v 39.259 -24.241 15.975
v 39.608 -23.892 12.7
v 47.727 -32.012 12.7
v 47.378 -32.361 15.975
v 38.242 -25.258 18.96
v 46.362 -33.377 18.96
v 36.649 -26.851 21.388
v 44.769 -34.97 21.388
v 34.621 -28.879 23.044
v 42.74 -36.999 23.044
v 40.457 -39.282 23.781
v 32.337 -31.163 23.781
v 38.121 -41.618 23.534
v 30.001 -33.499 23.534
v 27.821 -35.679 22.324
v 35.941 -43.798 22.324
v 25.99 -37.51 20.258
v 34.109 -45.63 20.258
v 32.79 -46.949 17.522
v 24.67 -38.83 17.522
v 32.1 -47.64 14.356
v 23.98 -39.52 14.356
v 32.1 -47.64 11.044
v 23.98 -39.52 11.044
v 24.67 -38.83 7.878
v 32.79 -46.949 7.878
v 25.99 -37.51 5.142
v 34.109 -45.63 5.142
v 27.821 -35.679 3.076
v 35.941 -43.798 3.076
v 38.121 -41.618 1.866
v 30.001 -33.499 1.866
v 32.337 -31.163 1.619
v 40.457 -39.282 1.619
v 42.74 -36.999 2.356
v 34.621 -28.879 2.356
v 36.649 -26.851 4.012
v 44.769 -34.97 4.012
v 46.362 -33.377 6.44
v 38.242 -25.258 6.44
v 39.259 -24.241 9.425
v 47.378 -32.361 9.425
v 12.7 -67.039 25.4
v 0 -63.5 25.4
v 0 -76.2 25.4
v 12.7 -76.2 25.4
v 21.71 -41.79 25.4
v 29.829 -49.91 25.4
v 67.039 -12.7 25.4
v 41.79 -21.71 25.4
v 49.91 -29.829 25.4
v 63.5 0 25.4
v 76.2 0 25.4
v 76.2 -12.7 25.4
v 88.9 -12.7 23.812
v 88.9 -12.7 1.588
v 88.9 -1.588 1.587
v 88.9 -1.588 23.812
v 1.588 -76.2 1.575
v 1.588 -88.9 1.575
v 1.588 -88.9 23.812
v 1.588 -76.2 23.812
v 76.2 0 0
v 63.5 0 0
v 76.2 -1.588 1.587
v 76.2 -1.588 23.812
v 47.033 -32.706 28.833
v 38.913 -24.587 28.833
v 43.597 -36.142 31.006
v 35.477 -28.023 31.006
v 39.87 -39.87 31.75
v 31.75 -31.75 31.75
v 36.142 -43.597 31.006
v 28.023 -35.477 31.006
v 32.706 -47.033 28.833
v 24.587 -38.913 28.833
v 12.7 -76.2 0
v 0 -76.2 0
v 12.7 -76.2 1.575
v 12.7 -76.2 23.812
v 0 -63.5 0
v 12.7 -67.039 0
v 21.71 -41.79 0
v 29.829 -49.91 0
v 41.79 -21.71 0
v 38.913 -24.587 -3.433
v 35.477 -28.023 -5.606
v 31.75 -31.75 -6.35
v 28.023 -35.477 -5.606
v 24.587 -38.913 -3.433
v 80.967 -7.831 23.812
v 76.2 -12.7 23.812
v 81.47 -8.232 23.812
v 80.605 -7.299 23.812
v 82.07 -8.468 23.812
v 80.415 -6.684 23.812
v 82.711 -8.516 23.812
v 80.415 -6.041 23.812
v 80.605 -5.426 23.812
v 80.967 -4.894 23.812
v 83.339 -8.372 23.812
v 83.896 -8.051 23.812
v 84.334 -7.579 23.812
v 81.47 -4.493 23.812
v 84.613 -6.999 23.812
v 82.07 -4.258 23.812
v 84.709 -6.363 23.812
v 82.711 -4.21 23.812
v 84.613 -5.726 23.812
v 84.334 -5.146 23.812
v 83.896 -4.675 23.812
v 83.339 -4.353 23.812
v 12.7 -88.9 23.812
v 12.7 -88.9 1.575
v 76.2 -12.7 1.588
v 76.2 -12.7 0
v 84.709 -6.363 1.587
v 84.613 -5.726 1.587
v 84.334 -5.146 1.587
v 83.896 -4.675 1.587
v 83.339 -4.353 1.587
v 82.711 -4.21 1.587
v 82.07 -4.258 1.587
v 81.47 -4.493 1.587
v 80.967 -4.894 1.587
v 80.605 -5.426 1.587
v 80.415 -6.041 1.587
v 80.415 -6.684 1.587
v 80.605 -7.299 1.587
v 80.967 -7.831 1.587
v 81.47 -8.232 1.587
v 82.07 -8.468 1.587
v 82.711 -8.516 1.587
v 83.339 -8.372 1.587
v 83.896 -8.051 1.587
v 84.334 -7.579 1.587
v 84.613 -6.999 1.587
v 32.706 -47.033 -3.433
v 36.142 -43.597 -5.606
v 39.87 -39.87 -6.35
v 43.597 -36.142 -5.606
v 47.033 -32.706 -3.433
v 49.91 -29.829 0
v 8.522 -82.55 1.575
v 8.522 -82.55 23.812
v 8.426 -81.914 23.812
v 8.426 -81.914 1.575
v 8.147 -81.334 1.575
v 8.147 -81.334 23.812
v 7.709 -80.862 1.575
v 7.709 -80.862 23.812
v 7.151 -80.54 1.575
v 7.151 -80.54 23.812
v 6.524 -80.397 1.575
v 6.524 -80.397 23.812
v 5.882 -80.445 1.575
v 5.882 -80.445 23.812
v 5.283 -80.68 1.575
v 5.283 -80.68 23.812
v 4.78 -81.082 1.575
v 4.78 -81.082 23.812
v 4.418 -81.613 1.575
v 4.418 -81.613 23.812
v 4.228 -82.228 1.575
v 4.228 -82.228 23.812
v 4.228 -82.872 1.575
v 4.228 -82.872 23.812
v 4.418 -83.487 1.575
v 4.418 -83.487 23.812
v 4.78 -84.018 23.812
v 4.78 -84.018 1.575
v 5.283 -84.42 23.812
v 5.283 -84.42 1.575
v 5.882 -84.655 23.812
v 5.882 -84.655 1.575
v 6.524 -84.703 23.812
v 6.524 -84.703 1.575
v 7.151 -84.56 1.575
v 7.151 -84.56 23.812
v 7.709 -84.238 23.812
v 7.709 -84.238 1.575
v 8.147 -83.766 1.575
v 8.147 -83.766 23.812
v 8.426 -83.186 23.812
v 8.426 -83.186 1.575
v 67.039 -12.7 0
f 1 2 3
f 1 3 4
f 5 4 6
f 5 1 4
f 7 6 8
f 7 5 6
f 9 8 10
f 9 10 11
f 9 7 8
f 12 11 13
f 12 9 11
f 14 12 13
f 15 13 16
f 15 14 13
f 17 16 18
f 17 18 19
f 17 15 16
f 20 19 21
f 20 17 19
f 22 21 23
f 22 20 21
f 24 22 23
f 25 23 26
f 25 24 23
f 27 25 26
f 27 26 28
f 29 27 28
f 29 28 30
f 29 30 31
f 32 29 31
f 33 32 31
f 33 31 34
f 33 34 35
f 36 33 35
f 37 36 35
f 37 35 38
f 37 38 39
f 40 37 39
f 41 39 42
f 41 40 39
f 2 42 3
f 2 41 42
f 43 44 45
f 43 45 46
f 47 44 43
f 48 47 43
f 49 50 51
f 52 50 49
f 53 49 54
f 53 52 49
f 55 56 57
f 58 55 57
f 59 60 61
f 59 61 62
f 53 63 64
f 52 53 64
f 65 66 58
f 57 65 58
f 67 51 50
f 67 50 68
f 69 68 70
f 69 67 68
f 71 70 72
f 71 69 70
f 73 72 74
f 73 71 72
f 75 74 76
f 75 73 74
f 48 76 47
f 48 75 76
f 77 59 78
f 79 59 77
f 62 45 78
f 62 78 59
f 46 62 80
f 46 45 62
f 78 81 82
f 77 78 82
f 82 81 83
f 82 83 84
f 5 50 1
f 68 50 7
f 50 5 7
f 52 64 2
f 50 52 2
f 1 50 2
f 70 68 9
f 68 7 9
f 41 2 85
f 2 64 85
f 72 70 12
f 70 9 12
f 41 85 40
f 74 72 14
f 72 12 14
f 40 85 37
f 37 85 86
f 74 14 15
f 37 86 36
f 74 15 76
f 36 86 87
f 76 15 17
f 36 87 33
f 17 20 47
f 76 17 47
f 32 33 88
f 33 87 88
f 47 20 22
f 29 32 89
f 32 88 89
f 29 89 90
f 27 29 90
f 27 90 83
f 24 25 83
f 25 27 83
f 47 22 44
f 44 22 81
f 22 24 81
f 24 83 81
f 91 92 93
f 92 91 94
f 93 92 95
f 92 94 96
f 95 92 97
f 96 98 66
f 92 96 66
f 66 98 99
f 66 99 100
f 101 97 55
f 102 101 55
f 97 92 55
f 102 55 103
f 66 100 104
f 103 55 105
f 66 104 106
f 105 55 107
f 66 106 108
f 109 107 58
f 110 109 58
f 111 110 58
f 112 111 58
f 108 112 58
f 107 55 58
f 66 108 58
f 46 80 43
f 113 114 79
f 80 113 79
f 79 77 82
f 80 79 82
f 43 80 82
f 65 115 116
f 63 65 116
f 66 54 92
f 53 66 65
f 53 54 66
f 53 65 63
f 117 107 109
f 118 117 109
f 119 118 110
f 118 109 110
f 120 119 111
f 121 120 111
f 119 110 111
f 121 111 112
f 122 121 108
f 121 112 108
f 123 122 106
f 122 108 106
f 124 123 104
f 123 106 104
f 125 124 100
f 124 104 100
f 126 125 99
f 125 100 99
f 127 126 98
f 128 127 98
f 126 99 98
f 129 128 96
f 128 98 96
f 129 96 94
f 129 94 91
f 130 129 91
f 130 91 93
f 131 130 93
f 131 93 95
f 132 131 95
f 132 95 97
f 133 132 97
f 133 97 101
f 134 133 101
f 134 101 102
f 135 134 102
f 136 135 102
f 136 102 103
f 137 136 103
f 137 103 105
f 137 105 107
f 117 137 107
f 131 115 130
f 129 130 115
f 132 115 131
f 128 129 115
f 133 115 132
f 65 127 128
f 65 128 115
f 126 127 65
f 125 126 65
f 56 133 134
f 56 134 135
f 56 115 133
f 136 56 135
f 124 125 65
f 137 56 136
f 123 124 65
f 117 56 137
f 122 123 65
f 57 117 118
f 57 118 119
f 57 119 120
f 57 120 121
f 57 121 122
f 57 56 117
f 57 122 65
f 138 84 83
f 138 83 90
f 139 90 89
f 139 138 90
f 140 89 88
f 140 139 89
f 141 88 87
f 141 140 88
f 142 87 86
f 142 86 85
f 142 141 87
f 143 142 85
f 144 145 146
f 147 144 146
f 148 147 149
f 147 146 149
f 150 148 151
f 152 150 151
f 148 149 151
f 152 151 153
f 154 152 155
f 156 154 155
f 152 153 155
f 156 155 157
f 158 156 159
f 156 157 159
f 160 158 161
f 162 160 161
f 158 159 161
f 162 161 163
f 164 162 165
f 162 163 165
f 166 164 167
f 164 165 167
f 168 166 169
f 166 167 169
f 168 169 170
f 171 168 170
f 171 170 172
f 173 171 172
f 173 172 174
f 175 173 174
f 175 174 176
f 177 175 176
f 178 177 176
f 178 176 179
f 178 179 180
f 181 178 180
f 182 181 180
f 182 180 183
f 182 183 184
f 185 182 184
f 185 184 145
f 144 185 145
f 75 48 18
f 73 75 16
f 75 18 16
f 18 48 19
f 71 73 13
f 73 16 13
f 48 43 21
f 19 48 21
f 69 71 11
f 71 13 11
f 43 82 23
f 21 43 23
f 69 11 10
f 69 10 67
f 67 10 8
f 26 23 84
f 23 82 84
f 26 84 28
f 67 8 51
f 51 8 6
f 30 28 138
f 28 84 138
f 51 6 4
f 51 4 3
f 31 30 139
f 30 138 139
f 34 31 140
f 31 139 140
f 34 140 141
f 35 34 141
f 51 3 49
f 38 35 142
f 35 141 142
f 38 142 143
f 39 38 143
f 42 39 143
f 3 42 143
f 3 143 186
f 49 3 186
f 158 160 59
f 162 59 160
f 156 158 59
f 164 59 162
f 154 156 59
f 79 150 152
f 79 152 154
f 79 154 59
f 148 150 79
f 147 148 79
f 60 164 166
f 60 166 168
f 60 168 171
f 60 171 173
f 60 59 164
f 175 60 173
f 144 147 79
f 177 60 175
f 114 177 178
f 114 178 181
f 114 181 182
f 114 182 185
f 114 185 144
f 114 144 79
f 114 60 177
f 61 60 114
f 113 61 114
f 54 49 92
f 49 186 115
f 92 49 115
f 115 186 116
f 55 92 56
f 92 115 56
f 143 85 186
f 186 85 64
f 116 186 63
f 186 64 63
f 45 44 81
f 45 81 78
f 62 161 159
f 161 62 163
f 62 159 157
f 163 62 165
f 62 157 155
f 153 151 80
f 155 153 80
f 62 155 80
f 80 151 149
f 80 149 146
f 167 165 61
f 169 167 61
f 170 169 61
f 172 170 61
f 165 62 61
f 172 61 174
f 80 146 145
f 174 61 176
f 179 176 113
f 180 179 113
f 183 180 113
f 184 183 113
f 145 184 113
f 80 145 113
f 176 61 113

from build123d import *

# Parameters (mm, degrees)
BOSS_EXTRUDE1_DEPTH    = 25.4
SKETCH2_R              = 2.159
SKETCH2_W              = 12.7
SKETCH2_H              = 1.5875
SKETCH2_W_2            = 1.5875
SKETCH2_H_2            = 12.7
CUT_EXTRUDE1_DEPTH     = 25.4
SKETCH3_W              = 12.7
SKETCH3_H              = 1.5875
SKETCH3_H_2            = 1.5748
CUT_EXTRUDE2_DEPTH     = 12.7
SKETCH4_W              = 1.5875
SKETCH4_H              = 12.7
CUT_EXTRUDE3_DEPTH     = 12.7
F_3DSKETCH1_R          = 19.05
F_3DSKETCH1_R_2        = 11.1125
BOSS_EXTRUDE2_DEPTH    = 11.482870812
CUT_EXTRUDE4_START     = 44.901280605
CUT_EXTRUDE4_OUTLINE_R = 11.1125
CUT_EXTRUDE4_DEPTH     = 11.482870812


# Read off the part's stored shape, not the designer's step: Cut-Extrude4
with BuildPart() as part:
    # Sketch1 → Boss-Extrude1 (new body)
    with BuildSketch(Plane.XY):
        Polygon((88.9, 0), (63.5, 0), (0, -63.5), (0, -88.9), (12.7, -88.9), (12.7, -67.039231637), (67.039231637, -12.7), (88.9, -12.7), align=None)
    extrude(amount=BOSS_EXTRUDE1_DEPTH)

    # Sketch2 → Cut-Extrude1 (cut)
    with BuildSketch(Plane.XY.offset(25.4)):
        with Locations((82.55, -6.3627)):
            Circle(SKETCH2_R)
        with Locations((6.3627, -82.55)):
            Circle(SKETCH2_R)
        with Locations((82.55, -0.79375)):
            Rectangle(SKETCH2_W, SKETCH2_H)
        with Locations((0.79375, -82.55)):
            Rectangle(SKETCH2_W_2, SKETCH2_H_2)
    extrude(amount=-CUT_EXTRUDE1_DEPTH, mode=Mode.SUBTRACT)

    # Sketch3 → Cut-Extrude2 (cut)
    with BuildSketch(Plane.XZ.offset(88.9)):
        with Locations((6.35, 24.60625)):
            Rectangle(SKETCH3_W, SKETCH3_H)
        with Locations((6.35, 0.7874)):
            Rectangle(SKETCH3_W, SKETCH3_H_2)
    extrude(amount=-CUT_EXTRUDE2_DEPTH, mode=Mode.SUBTRACT)

    # Sketch4 → Cut-Extrude3 (cut)
    with BuildSketch(Plane(origin=(88.9, 0, 0), x_dir=(0, 0, -1), z_dir=(1, 0, 0))):
        with Locations((-0.79375, -6.35)):
            Rectangle(SKETCH4_W, SKETCH4_H)
        with Locations((-24.60625, -6.35)):
            Rectangle(SKETCH4_W, SKETCH4_H)
    extrude(amount=-CUT_EXTRUDE3_DEPTH, mode=Mode.SUBTRACT)

    # 3DSketch1 → Boss-Extrude2 (add)
    with BuildSketch(Plane(origin=(67.039231637, -12.7, 0), x_dir=(-0.6713837490692134, -0.6713837490692195, 0.3138275369873187), z_dir=(0.7071067811865508, -0.7071067811865444, 0))):
        with Locations((40.468086778, 0)):
            Circle(F_3DSKETCH1_R)
        with Locations((40.468086778, 0)):
            Circle(F_3DSKETCH1_R_2, mode=Mode.SUBTRACT)
    extrude(amount=-BOSS_EXTRUDE2_DEPTH)

    # Cut-Extrude4 outline → Cut-Extrude4 (cut)
    with BuildSketch(Plane(origin=(0, 0, 0), x_dir=(0.7071067811865438, 0.7071067811865512, 0), z_dir=(0.7071067811865511, -0.7071067811865441, 0)).offset(CUT_EXTRUDE4_START)):
        with Locations((0, 12.7)):
            Circle(CUT_EXTRUDE4_OUTLINE_R)
    extrude(amount=CUT_EXTRUDE4_DEPTH, mode=Mode.SUBTRACT)


solid = part.part
